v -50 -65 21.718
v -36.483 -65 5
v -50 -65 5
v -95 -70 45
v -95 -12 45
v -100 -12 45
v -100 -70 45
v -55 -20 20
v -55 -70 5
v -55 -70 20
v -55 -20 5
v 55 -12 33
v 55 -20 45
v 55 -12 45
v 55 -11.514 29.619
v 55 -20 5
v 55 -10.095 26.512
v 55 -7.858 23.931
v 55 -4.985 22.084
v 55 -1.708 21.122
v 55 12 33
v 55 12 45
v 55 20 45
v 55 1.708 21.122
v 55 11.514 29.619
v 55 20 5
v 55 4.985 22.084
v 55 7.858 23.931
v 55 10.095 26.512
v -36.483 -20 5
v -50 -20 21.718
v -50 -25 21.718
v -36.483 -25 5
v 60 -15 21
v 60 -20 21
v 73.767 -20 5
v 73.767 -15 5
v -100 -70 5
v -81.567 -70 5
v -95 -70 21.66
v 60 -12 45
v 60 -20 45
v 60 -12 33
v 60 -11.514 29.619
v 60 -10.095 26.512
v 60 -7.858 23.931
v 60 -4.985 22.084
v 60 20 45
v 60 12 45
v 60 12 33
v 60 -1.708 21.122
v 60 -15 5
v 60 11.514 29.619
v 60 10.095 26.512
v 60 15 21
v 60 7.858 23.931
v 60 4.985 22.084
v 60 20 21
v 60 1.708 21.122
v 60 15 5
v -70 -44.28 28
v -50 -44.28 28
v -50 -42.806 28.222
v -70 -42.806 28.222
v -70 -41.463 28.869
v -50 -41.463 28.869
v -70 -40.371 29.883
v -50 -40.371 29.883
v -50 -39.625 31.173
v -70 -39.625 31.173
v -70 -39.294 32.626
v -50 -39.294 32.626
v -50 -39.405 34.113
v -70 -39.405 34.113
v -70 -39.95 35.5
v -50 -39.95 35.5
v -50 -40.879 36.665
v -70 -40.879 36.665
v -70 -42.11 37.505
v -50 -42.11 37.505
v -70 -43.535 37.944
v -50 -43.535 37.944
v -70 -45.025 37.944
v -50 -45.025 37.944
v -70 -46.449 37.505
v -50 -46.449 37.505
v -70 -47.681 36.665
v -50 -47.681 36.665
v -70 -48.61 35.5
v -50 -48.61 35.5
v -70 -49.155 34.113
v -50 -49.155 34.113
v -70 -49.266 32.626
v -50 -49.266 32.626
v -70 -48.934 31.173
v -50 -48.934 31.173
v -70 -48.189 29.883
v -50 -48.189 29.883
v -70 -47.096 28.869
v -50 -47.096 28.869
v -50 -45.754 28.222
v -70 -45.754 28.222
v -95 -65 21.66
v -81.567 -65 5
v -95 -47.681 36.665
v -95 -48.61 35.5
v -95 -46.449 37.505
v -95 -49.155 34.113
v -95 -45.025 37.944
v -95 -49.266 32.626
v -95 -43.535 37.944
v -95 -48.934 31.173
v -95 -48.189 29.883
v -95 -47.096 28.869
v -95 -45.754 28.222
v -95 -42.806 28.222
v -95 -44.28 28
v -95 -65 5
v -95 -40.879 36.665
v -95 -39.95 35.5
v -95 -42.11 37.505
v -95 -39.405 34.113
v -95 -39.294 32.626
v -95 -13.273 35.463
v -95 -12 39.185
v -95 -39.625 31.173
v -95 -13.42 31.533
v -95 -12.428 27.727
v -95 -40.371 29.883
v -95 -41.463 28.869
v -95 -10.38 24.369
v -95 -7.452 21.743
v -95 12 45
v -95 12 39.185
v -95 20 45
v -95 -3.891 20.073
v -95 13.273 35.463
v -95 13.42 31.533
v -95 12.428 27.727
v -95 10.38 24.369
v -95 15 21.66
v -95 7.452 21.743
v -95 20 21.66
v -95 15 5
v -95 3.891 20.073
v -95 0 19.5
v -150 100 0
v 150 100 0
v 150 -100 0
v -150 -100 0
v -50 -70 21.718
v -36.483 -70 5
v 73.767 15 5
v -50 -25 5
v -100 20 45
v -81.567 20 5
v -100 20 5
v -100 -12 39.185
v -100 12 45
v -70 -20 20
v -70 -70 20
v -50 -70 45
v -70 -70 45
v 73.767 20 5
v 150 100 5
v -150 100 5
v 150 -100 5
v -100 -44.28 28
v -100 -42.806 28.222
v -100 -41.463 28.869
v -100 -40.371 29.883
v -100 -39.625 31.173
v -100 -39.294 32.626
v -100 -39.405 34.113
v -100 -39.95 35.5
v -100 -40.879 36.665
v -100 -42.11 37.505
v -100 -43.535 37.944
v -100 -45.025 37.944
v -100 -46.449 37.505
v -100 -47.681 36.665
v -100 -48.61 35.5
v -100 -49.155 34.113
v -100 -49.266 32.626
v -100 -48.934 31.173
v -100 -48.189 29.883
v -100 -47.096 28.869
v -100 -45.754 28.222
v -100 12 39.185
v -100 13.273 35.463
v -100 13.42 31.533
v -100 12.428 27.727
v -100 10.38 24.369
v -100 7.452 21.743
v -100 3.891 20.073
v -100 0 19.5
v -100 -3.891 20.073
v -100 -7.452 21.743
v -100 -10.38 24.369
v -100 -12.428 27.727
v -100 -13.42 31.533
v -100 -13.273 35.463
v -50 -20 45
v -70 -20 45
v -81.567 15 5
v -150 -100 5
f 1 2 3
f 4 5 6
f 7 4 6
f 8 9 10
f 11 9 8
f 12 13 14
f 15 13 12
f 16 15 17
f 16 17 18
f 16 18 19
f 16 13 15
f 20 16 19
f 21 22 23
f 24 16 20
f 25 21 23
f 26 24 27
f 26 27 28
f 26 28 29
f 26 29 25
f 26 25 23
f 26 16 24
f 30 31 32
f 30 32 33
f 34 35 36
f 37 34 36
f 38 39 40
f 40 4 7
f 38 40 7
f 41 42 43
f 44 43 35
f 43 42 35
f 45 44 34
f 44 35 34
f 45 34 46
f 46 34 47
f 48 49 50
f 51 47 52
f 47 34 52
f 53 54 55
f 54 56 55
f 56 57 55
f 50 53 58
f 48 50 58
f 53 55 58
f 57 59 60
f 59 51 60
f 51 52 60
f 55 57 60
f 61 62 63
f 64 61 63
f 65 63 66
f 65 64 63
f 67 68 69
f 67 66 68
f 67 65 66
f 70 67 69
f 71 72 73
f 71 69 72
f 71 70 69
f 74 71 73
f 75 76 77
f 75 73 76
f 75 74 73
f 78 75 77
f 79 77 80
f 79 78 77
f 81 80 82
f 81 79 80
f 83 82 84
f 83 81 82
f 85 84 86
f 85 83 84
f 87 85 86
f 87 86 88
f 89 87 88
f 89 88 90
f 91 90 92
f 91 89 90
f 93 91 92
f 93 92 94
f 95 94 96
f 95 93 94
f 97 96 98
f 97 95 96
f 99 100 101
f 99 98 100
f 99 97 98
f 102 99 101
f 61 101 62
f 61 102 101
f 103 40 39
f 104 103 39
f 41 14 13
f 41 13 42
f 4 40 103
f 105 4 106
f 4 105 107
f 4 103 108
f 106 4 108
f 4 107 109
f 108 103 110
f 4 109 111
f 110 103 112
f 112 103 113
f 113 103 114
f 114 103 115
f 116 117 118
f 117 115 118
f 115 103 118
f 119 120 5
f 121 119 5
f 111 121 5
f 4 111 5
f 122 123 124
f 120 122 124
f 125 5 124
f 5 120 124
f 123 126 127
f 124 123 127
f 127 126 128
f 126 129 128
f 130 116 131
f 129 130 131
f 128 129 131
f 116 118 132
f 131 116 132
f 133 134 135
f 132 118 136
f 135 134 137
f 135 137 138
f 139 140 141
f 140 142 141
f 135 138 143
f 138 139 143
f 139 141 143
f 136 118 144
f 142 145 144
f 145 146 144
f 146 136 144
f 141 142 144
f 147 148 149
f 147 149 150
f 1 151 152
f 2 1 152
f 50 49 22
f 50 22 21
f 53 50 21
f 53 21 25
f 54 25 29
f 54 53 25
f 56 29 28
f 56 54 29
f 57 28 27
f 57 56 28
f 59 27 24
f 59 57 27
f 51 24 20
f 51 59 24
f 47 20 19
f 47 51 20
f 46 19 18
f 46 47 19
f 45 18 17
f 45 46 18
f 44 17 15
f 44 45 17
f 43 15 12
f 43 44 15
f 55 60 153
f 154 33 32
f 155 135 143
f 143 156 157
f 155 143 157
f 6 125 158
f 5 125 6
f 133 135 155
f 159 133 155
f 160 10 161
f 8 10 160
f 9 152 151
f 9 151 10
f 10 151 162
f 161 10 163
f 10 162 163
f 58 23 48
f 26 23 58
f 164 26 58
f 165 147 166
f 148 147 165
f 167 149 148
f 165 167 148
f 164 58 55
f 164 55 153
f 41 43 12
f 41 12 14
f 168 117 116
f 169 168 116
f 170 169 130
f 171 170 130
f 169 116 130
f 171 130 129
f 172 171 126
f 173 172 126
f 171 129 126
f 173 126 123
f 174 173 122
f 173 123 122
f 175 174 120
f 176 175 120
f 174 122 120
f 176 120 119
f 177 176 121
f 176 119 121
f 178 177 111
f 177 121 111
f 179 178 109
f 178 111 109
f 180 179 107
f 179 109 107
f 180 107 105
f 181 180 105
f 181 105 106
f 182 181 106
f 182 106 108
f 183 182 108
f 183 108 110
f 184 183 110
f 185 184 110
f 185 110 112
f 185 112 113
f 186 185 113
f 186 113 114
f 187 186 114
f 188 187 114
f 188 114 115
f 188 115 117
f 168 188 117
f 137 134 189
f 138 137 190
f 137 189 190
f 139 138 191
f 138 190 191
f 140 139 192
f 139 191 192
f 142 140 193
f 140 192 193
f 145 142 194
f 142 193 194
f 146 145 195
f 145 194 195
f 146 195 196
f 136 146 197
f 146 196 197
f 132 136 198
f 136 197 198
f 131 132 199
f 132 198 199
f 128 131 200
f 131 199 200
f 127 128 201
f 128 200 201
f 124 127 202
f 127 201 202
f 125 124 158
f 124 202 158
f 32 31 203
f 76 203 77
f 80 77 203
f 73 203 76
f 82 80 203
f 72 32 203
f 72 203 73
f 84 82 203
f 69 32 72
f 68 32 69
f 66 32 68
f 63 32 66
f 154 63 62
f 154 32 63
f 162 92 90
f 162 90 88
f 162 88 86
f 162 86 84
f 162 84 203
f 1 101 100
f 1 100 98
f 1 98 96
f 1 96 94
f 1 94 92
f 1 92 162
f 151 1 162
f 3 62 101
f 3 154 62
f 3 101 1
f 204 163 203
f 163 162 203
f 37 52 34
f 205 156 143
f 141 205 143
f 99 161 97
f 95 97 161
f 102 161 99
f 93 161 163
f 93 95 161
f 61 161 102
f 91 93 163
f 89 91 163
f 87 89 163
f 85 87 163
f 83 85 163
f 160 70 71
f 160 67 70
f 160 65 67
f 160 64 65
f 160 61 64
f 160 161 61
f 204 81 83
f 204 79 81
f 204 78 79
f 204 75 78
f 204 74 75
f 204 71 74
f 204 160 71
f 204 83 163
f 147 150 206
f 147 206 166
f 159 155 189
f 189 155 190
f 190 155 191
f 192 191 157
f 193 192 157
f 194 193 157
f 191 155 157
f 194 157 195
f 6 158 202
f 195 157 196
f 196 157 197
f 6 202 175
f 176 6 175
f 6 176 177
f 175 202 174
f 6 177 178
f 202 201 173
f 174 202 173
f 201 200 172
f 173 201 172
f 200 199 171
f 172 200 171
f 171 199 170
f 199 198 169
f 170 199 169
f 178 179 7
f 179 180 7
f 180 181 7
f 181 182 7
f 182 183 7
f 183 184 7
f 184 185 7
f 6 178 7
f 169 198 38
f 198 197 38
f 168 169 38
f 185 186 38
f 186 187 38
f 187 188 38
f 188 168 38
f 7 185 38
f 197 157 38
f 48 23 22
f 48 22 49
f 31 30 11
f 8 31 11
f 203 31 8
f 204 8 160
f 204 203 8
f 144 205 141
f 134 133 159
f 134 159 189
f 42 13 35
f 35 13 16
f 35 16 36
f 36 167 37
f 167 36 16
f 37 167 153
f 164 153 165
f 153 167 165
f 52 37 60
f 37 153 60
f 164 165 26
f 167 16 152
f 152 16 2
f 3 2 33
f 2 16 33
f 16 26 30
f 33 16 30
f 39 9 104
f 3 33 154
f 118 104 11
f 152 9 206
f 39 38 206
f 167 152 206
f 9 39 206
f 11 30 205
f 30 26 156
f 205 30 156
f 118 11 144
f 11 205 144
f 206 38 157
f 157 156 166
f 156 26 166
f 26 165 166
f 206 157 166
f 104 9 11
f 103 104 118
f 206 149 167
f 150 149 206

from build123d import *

# Parameters (mm, degrees)
SKETCH1_W            = 300
SKETCH1_H            = 200
BOSS_EXTRUDE1_DEPTH  = 5
SKETCH3_W            = 20
SKETCH3_H            = 20
SKETCH3_H_2          = 40
CUT_EXTRUDE1_DEPTH   = 5
SKETCH4_W            = 20
SKETCH4_H            = 40
CUT_EXTRUDE2_DEPTH   = 10
SKETCH6_W            = 300
SKETCH6_H            = 200
BOSS_EXTRUDE2_DEPTH  = 5
BOSS_EXTRUDE4_DEPTH  = 40
SKETCH8_3_W          = 5
SKETCH8_3_H          = 40
BOSS_EXTRUDE5_DEPTH  = 40
CUT_EXTRUDE3_DEPTH   = 236
SKETCH10_R           = 5
CUT_EXTRUDE4_DEPTH   = 236
BOSS_EXTRUDE6_DEPTH  = 5
BOSS_EXTRUDE7_DEPTH  = 5
BOSS_EXTRUDE8_DEPTH  = 5
CUT_EXTRUDE5_DEPTH   = 10
SKETCH19_W           = 25
SKETCH19_H           = 50
BOSS_EXTRUDE10_DEPTH = 15
BOSS_EXTRUDE11_DEPTH = 5
SKETCH22_R           = 5
CUT_EXTRUDE6_DEPTH   = 39
SKETCH23_R           = 13.5
CUT_EXTRUDE7_DEPTH   = 10


with BuildPart() as part:
    # Sketch1 → Boss-Extrude1 (new body)
    with BuildSketch(Plane.XY):
        Rectangle(SKETCH1_W, SKETCH1_H)
    extrude(amount=BOSS_EXTRUDE1_DEPTH)

    # Sketch3 → Cut-Extrude1 (cut)
    with BuildSketch(Plane.XY.offset(5)):
        with Locations((-140, -90)):
            Rectangle(SKETCH3_W, SKETCH3_H)
        with Locations((-140, 80)):
            Rectangle(SKETCH3_W, SKETCH3_H_2)
        with Locations((140, 80)):
            Rectangle(SKETCH3_W, SKETCH3_H_2)
        with Locations((140, -90)):
            Rectangle(SKETCH3_W, SKETCH3_H)
    extrude(amount=-CUT_EXTRUDE1_DEPTH, mode=Mode.SUBTRACT)

    # Sketch4 → Cut-Extrude2 (cut)
    with BuildSketch(Plane(origin=(0, 0, 0), x_dir=(-1, 0, 0), z_dir=(0, 0, -1))):
        with Locations((-140, -80)):
            Rectangle(SKETCH4_W, SKETCH4_H)
        with Locations((140, -80)):
            Rectangle(SKETCH4_W, SKETCH4_H)
    extrude(amount=-CUT_EXTRUDE2_DEPTH, mode=Mode.SUBTRACT)

    # Sketch6 → Boss-Extrude2 (add)
    with BuildSketch(Plane(origin=(0, 0, 0), x_dir=(-1, 0, 0), z_dir=(0, 0, -1))):
        Rectangle(SKETCH6_W, SKETCH6_H)
    extrude(amount=-BOSS_EXTRUDE2_DEPTH)

    # Sketch8 → Boss-Extrude4 (add)
    with BuildSketch(Plane.XY.offset(5)):
        Polygon((-100, 20), (-95, 20), (-95, -20), (-95, -70), (-100, -70), (-100, -20), align=None)
    boss_extrude4 = extrude(amount=BOSS_EXTRUDE4_DEPTH)

    # Sketch8<3> → Boss-Extrude5 (add)
    with BuildSketch(Plane.XY.offset(5)):
        with Locations((57.5, 0)):
            Rectangle(SKETCH8_3_W, SKETCH8_3_H)
    extrude(amount=BOSS_EXTRUDE5_DEPTH)

    # Sketch9 → Cut-Extrude3 (cut)
    with BuildSketch(Plane(origin=(60, 0, 0), x_dir=(0, 0, -1), z_dir=(1, 0, 0))):
        with BuildLine():
            Line((-45, 12), (-33, 12))
            ThreePointArc((-33, 12), (-21, 0), (-33, -12))
            Line((-33, -12), (-45, -12))
            Line((-45, -12), (-45, 12))
        make_face()
    extrude(amount=-CUT_EXTRUDE3_DEPTH, mode=Mode.SUBTRACT)

    # Sketch10 → Cut-Extrude4 (cut)
    with BuildSketch(Plane(origin=(-95, 0, 0), x_dir=(0, 0, -1), z_dir=(1, 0, 0))):
        with Locations((-33, -44.279864558)):
            Circle(SKETCH10_R)
    cut_extrude4 = extrude(amount=-CUT_EXTRUDE4_DEPTH, mode=Mode.SUBTRACT)

    # Sketch11 → Boss-Extrude6 (add)
    with BuildSketch(Plane.XZ.offset(70)):
        Polygon((-95, 21.66038922), (-81.566809401, 5), (-95, 5), align=None)
    extrude(amount=-BOSS_EXTRUDE6_DEPTH)

    # Sketch12 → Boss-Extrude7 (add)
    with BuildSketch(Plane(origin=(0, 20, 0), x_dir=(1, 0, 0), z_dir=(0, 1, 0))):
        Polygon((60, -21), (73.767048753, -5), (60, -5), align=None)
    boss_extrude7 = extrude(amount=-BOSS_EXTRUDE7_DEPTH)

    # Sketch12<3> → Boss-Extrude8 (add)
    with BuildSketch(Plane(origin=(0, 20, 0), x_dir=(1, 0, 0), z_dir=(0, 1, 0))):
        Polygon((-81.566809401, -5), (-95, -21.66038922), (-95, -5), align=None)
    extrude(amount=-BOSS_EXTRUDE8_DEPTH)

    # Mirror1: Boss-Extrude7 across plane
    add(boss_extrude7.mirror(Plane(origin=(0, 0, 0), x_dir=(0, 0, 1), z_dir=(0, -1, 0))))

    # Mirror3: Boss-Extrude4, Cut-Extrude4 across plane
    add(boss_extrude4.mirror(Plane(origin=(-75, 0, 0), x_dir=(0, 0, 1), z_dir=(1, 0, 0))))
    add(cut_extrude4.mirror(Plane(origin=(-75, 0, 0), x_dir=(0, 0, 1), z_dir=(1, 0, 0))), mode=Mode.SUBTRACT)

    # Sketch17 → Cut-Extrude5 (cut)
    with BuildSketch(Plane.ZY.offset(55)):
        Polygon((5, -20), (45, -20), (45, -12), (45, 20), (5, 20), align=None)
    extrude(amount=-CUT_EXTRUDE5_DEPTH, mode=Mode.SUBTRACT)

    # Sketch19 → Boss-Extrude10 (add)
    with BuildSketch(Plane.ZY.offset(55)):
        with Locations((32.5, -45)):
            Rectangle(SKETCH19_W, SKETCH19_H)
    extrude(amount=BOSS_EXTRUDE10_DEPTH)

    # Sketch20 → Boss-Extrude11 (add)
    with BuildSketch(Plane.XZ.offset(70)):
        Polygon((-50, 21.717977163), (-36.483235136, 5), (-50, 5), align=None)
    boss_extrude11 = extrude(amount=-BOSS_EXTRUDE11_DEPTH)

    # Mirror4: Boss-Extrude11 across plane
    add(boss_extrude11.mirror(Plane.ZX.offset(-45)))

    # Sketch22 → Cut-Extrude6 (cut)
    with BuildSketch(Plane(origin=(-75, 0, 0), x_dir=(0, 0, -1), z_dir=(1, 0, 0))):
        with Locations((-33, -44.279864558)):
            Circle(SKETCH22_R)
    extrude(amount=CUT_EXTRUDE6_DEPTH, mode=Mode.SUBTRACT)

    # Sketch23 → Cut-Extrude7 (cut)
    with BuildSketch(Plane.ZY.offset(100)):
        with Locations((33, 0)):
            Circle(SKETCH23_R)
    extrude(amount=-CUT_EXTRUDE7_DEPTH, mode=Mode.SUBTRACT)


solid = part.part
